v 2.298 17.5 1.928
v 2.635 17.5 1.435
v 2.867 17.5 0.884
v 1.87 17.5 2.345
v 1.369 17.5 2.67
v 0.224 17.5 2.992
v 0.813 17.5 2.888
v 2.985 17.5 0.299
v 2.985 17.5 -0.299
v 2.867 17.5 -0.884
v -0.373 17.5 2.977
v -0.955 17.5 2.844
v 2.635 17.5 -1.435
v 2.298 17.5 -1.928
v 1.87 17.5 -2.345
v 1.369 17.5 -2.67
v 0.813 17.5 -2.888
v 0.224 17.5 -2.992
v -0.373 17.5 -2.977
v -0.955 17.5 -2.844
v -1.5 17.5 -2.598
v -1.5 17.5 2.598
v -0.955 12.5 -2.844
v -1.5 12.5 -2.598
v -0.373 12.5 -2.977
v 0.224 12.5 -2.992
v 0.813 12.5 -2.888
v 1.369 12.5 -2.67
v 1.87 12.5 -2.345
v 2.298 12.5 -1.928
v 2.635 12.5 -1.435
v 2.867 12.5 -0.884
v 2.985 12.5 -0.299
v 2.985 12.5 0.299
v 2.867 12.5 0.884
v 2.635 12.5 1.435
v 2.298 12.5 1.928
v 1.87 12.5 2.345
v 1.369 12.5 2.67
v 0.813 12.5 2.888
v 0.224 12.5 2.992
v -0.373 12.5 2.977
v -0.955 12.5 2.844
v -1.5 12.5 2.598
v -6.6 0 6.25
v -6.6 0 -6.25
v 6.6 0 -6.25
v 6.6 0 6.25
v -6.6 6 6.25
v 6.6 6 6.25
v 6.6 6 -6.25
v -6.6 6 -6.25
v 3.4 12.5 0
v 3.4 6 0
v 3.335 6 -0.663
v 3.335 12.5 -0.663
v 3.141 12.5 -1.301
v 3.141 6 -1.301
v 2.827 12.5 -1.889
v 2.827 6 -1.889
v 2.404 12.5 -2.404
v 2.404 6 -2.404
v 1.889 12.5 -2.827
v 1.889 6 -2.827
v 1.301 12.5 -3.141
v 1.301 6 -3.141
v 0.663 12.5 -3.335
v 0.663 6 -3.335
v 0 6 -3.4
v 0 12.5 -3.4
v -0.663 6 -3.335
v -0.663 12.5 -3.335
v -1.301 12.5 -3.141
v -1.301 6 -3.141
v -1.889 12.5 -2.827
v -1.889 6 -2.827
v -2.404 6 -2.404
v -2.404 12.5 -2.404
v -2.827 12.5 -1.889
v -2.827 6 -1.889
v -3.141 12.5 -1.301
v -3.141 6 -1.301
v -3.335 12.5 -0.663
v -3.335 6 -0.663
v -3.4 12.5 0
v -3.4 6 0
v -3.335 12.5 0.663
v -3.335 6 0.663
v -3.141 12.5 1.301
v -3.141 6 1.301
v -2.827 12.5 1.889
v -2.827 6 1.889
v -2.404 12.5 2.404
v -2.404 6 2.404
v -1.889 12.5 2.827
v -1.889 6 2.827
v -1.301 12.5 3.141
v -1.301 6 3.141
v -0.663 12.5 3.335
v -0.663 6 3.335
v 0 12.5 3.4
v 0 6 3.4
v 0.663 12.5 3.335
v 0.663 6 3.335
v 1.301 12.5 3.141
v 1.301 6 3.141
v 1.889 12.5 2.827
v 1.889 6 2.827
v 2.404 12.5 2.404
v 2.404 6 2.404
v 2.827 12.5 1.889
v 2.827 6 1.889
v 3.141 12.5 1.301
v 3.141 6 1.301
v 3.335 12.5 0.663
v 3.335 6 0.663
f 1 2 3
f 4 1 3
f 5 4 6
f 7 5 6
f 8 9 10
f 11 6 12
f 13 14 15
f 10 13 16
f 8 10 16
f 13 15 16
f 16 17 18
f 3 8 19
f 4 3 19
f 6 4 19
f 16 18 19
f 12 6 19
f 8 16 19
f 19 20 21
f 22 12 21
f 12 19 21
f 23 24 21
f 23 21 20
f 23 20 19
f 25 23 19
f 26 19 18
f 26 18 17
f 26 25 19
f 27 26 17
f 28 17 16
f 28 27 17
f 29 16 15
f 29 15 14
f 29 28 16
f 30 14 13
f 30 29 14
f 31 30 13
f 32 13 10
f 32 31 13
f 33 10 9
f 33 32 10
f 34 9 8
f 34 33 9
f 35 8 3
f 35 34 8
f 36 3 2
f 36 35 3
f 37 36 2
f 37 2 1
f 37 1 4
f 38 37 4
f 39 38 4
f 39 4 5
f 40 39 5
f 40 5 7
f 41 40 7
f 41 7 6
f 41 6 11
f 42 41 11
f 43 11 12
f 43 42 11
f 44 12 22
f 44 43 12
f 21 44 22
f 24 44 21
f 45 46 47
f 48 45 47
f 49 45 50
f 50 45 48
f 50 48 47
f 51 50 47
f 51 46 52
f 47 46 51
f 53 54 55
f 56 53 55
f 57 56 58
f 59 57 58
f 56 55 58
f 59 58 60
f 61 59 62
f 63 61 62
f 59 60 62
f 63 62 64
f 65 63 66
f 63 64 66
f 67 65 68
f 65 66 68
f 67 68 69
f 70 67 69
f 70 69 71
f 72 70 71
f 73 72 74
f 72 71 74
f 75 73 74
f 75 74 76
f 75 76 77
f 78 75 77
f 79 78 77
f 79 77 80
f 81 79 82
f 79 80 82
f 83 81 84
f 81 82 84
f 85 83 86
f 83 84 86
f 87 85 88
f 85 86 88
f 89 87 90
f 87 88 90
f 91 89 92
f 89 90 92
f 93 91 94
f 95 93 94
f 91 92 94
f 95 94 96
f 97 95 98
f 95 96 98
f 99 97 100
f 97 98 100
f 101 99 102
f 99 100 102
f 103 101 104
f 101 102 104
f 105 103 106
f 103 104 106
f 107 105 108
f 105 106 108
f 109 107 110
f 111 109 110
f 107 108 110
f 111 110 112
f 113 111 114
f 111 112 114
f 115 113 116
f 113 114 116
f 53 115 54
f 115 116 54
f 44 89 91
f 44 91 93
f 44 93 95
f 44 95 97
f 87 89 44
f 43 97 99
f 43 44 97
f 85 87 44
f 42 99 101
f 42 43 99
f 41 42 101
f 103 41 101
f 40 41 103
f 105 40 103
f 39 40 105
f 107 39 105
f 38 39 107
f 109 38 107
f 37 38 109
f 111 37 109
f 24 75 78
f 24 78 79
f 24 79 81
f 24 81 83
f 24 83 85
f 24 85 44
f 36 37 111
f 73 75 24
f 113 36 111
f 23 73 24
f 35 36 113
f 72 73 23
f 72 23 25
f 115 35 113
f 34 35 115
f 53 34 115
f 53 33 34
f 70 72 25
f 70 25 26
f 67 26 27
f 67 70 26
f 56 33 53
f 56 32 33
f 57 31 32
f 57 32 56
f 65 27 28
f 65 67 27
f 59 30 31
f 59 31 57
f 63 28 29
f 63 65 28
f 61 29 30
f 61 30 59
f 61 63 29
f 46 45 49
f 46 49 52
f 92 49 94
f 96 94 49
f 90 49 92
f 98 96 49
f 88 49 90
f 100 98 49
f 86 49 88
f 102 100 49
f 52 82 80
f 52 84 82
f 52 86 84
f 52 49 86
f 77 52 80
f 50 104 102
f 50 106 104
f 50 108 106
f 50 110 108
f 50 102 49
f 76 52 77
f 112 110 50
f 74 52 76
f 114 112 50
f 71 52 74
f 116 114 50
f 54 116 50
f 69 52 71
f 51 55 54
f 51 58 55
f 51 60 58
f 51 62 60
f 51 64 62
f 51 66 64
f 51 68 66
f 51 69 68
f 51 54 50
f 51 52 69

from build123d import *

# Parameters (mm, degrees)
SKETCH1_W           = 13.2
SKETCH1_H           = 12.5
BOSS_EXTRUDE1_DEPTH = 6
SKETCH2_R           = 3.4
BOSS_EXTRUDE2_DEPTH = 6.5
BOSS_EXTRUDE3_DEPTH = 5


with BuildPart() as part:
    # Sketch1 → Boss-Extrude1 (new body)
    with BuildSketch(Plane(origin=(0, 0, 0), x_dir=(1, 0, 0), z_dir=(0, 1, 0))):
        Rectangle(SKETCH1_W, SKETCH1_H)
    extrude(amount=BOSS_EXTRUDE1_DEPTH)

    # Sketch2 → Boss-Extrude2 (add)
    with BuildSketch(Plane(origin=(0, 6, 0), x_dir=(1, 0, 0), z_dir=(0, 1, 0))):
        Circle(SKETCH2_R)
    extrude(amount=BOSS_EXTRUDE2_DEPTH)

    # Sketch3 → Boss-Extrude3 (add)
    with BuildSketch(Plane(origin=(0, 12.5, 0), x_dir=(1, 0, 0), z_dir=(0, 1, 0))):
        with BuildLine():
            Line((-1.5, -2.598076211), (-1.5, 2.598076211))
            ThreePointArc((-1.5, 2.598076211), (3, 0), (-1.5, -2.598076211))
        make_face()
    extrude(amount=BOSS_EXTRUDE3_DEPTH)


solid = part.part
